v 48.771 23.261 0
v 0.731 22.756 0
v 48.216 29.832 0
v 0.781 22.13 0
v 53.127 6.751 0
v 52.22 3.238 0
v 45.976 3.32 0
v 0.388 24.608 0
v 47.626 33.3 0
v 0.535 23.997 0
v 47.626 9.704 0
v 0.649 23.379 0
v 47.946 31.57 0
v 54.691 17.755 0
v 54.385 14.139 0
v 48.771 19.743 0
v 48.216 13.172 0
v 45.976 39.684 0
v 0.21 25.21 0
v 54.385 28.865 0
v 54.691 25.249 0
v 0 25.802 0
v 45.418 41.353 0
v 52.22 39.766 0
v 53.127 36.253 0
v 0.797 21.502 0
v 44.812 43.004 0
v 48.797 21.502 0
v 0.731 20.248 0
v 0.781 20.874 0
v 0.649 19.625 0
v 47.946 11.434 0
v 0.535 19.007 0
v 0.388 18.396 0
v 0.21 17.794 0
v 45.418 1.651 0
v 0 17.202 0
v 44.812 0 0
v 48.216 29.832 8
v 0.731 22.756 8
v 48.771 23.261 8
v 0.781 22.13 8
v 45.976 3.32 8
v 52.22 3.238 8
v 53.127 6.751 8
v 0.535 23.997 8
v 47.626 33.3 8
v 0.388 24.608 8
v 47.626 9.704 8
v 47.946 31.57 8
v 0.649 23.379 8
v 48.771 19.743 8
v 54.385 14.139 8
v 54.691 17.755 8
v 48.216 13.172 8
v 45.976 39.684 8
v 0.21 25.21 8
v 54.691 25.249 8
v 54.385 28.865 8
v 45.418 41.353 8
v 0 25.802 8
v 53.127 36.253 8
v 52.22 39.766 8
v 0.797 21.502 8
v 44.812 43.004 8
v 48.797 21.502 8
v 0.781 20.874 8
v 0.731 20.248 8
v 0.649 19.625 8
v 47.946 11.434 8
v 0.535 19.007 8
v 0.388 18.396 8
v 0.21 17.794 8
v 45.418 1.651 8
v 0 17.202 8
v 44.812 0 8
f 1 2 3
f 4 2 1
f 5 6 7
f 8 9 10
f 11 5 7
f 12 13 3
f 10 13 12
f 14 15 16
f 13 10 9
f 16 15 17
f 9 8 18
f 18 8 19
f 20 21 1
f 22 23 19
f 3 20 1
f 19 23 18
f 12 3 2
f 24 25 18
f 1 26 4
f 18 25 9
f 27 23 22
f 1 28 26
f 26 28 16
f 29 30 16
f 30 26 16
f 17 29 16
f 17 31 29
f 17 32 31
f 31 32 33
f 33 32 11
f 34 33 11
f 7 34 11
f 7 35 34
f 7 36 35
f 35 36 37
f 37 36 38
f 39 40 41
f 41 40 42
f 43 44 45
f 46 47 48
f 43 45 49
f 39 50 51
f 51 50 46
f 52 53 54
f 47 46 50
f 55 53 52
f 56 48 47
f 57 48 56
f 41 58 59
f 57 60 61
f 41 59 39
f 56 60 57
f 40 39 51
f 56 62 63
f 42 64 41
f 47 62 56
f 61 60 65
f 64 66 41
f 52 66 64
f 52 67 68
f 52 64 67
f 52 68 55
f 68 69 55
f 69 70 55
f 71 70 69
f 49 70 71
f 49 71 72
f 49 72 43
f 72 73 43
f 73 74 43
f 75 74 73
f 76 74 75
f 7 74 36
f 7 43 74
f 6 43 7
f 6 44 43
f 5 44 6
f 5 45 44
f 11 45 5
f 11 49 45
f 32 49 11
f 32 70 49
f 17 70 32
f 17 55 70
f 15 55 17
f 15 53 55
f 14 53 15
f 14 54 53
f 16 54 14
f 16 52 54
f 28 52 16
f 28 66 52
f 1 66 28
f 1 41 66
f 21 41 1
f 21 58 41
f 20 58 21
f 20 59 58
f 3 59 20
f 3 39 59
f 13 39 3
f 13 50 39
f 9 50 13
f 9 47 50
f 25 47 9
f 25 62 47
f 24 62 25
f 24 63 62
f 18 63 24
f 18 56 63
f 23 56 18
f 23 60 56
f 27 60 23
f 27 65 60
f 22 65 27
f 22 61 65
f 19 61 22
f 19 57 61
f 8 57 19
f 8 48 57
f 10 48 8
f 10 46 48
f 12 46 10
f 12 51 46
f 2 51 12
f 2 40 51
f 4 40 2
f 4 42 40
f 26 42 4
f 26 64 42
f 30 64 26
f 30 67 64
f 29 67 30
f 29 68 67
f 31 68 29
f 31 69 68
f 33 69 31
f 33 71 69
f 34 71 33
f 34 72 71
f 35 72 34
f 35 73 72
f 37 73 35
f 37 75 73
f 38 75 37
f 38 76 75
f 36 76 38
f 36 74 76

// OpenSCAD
$fn = 32;

// ----------------------------------------------------------------------
// Gear sector: 4 teeth on 42 degrees
// ----------------------------------------------------------------------

// --- parameters (mm) ---
sector_angle = 42;        // sector angle, degrees
root_r = 60;              // root circle radius
tooth_h = 6;              // tooth height over the root circle
teeth = 4;                // number of teeth on the sector
hub_r = 12;               // hub bore radius
plate_t = 8;              // sector thickness, Z
arc_step = 3;             // sampling step of the root/hub arcs, degrees

tip_r = root_r + tooth_h;  // tip circle radius

profile = [[44.812, 0], [45.418, 1.651], [45.976, 3.32], [52.22, 3.238], [53.127, 6.751], [47.626, 9.704], [47.946, 11.434], [48.216, 13.172], [54.385, 14.139], [54.691, 17.755], [48.771, 19.743], [48.797, 21.502], [48.771, 23.261], [54.691, 25.249], [54.385, 28.865], [48.216, 29.832], [47.946, 31.57], [47.626, 33.3], [53.127, 36.253], [52.22, 39.766], [45.976, 39.684], [45.418, 41.353], [44.812, 43.004], [0, 25.802], [0.21, 25.21], [0.388, 24.608], [0.535, 23.997], [0.649, 23.379], [0.731, 22.756], [0.781, 22.13], [0.797, 21.502], [0.781, 20.874], [0.731, 20.248], [0.649, 19.625], [0.535, 19.007], [0.388, 18.396], [0.21, 17.794], [0, 17.202]];  // primary outline, 38 points, counter clockwise

// --- the one profile operation ---
linear_extrude(height = plate_t) polygon(points = profile);
